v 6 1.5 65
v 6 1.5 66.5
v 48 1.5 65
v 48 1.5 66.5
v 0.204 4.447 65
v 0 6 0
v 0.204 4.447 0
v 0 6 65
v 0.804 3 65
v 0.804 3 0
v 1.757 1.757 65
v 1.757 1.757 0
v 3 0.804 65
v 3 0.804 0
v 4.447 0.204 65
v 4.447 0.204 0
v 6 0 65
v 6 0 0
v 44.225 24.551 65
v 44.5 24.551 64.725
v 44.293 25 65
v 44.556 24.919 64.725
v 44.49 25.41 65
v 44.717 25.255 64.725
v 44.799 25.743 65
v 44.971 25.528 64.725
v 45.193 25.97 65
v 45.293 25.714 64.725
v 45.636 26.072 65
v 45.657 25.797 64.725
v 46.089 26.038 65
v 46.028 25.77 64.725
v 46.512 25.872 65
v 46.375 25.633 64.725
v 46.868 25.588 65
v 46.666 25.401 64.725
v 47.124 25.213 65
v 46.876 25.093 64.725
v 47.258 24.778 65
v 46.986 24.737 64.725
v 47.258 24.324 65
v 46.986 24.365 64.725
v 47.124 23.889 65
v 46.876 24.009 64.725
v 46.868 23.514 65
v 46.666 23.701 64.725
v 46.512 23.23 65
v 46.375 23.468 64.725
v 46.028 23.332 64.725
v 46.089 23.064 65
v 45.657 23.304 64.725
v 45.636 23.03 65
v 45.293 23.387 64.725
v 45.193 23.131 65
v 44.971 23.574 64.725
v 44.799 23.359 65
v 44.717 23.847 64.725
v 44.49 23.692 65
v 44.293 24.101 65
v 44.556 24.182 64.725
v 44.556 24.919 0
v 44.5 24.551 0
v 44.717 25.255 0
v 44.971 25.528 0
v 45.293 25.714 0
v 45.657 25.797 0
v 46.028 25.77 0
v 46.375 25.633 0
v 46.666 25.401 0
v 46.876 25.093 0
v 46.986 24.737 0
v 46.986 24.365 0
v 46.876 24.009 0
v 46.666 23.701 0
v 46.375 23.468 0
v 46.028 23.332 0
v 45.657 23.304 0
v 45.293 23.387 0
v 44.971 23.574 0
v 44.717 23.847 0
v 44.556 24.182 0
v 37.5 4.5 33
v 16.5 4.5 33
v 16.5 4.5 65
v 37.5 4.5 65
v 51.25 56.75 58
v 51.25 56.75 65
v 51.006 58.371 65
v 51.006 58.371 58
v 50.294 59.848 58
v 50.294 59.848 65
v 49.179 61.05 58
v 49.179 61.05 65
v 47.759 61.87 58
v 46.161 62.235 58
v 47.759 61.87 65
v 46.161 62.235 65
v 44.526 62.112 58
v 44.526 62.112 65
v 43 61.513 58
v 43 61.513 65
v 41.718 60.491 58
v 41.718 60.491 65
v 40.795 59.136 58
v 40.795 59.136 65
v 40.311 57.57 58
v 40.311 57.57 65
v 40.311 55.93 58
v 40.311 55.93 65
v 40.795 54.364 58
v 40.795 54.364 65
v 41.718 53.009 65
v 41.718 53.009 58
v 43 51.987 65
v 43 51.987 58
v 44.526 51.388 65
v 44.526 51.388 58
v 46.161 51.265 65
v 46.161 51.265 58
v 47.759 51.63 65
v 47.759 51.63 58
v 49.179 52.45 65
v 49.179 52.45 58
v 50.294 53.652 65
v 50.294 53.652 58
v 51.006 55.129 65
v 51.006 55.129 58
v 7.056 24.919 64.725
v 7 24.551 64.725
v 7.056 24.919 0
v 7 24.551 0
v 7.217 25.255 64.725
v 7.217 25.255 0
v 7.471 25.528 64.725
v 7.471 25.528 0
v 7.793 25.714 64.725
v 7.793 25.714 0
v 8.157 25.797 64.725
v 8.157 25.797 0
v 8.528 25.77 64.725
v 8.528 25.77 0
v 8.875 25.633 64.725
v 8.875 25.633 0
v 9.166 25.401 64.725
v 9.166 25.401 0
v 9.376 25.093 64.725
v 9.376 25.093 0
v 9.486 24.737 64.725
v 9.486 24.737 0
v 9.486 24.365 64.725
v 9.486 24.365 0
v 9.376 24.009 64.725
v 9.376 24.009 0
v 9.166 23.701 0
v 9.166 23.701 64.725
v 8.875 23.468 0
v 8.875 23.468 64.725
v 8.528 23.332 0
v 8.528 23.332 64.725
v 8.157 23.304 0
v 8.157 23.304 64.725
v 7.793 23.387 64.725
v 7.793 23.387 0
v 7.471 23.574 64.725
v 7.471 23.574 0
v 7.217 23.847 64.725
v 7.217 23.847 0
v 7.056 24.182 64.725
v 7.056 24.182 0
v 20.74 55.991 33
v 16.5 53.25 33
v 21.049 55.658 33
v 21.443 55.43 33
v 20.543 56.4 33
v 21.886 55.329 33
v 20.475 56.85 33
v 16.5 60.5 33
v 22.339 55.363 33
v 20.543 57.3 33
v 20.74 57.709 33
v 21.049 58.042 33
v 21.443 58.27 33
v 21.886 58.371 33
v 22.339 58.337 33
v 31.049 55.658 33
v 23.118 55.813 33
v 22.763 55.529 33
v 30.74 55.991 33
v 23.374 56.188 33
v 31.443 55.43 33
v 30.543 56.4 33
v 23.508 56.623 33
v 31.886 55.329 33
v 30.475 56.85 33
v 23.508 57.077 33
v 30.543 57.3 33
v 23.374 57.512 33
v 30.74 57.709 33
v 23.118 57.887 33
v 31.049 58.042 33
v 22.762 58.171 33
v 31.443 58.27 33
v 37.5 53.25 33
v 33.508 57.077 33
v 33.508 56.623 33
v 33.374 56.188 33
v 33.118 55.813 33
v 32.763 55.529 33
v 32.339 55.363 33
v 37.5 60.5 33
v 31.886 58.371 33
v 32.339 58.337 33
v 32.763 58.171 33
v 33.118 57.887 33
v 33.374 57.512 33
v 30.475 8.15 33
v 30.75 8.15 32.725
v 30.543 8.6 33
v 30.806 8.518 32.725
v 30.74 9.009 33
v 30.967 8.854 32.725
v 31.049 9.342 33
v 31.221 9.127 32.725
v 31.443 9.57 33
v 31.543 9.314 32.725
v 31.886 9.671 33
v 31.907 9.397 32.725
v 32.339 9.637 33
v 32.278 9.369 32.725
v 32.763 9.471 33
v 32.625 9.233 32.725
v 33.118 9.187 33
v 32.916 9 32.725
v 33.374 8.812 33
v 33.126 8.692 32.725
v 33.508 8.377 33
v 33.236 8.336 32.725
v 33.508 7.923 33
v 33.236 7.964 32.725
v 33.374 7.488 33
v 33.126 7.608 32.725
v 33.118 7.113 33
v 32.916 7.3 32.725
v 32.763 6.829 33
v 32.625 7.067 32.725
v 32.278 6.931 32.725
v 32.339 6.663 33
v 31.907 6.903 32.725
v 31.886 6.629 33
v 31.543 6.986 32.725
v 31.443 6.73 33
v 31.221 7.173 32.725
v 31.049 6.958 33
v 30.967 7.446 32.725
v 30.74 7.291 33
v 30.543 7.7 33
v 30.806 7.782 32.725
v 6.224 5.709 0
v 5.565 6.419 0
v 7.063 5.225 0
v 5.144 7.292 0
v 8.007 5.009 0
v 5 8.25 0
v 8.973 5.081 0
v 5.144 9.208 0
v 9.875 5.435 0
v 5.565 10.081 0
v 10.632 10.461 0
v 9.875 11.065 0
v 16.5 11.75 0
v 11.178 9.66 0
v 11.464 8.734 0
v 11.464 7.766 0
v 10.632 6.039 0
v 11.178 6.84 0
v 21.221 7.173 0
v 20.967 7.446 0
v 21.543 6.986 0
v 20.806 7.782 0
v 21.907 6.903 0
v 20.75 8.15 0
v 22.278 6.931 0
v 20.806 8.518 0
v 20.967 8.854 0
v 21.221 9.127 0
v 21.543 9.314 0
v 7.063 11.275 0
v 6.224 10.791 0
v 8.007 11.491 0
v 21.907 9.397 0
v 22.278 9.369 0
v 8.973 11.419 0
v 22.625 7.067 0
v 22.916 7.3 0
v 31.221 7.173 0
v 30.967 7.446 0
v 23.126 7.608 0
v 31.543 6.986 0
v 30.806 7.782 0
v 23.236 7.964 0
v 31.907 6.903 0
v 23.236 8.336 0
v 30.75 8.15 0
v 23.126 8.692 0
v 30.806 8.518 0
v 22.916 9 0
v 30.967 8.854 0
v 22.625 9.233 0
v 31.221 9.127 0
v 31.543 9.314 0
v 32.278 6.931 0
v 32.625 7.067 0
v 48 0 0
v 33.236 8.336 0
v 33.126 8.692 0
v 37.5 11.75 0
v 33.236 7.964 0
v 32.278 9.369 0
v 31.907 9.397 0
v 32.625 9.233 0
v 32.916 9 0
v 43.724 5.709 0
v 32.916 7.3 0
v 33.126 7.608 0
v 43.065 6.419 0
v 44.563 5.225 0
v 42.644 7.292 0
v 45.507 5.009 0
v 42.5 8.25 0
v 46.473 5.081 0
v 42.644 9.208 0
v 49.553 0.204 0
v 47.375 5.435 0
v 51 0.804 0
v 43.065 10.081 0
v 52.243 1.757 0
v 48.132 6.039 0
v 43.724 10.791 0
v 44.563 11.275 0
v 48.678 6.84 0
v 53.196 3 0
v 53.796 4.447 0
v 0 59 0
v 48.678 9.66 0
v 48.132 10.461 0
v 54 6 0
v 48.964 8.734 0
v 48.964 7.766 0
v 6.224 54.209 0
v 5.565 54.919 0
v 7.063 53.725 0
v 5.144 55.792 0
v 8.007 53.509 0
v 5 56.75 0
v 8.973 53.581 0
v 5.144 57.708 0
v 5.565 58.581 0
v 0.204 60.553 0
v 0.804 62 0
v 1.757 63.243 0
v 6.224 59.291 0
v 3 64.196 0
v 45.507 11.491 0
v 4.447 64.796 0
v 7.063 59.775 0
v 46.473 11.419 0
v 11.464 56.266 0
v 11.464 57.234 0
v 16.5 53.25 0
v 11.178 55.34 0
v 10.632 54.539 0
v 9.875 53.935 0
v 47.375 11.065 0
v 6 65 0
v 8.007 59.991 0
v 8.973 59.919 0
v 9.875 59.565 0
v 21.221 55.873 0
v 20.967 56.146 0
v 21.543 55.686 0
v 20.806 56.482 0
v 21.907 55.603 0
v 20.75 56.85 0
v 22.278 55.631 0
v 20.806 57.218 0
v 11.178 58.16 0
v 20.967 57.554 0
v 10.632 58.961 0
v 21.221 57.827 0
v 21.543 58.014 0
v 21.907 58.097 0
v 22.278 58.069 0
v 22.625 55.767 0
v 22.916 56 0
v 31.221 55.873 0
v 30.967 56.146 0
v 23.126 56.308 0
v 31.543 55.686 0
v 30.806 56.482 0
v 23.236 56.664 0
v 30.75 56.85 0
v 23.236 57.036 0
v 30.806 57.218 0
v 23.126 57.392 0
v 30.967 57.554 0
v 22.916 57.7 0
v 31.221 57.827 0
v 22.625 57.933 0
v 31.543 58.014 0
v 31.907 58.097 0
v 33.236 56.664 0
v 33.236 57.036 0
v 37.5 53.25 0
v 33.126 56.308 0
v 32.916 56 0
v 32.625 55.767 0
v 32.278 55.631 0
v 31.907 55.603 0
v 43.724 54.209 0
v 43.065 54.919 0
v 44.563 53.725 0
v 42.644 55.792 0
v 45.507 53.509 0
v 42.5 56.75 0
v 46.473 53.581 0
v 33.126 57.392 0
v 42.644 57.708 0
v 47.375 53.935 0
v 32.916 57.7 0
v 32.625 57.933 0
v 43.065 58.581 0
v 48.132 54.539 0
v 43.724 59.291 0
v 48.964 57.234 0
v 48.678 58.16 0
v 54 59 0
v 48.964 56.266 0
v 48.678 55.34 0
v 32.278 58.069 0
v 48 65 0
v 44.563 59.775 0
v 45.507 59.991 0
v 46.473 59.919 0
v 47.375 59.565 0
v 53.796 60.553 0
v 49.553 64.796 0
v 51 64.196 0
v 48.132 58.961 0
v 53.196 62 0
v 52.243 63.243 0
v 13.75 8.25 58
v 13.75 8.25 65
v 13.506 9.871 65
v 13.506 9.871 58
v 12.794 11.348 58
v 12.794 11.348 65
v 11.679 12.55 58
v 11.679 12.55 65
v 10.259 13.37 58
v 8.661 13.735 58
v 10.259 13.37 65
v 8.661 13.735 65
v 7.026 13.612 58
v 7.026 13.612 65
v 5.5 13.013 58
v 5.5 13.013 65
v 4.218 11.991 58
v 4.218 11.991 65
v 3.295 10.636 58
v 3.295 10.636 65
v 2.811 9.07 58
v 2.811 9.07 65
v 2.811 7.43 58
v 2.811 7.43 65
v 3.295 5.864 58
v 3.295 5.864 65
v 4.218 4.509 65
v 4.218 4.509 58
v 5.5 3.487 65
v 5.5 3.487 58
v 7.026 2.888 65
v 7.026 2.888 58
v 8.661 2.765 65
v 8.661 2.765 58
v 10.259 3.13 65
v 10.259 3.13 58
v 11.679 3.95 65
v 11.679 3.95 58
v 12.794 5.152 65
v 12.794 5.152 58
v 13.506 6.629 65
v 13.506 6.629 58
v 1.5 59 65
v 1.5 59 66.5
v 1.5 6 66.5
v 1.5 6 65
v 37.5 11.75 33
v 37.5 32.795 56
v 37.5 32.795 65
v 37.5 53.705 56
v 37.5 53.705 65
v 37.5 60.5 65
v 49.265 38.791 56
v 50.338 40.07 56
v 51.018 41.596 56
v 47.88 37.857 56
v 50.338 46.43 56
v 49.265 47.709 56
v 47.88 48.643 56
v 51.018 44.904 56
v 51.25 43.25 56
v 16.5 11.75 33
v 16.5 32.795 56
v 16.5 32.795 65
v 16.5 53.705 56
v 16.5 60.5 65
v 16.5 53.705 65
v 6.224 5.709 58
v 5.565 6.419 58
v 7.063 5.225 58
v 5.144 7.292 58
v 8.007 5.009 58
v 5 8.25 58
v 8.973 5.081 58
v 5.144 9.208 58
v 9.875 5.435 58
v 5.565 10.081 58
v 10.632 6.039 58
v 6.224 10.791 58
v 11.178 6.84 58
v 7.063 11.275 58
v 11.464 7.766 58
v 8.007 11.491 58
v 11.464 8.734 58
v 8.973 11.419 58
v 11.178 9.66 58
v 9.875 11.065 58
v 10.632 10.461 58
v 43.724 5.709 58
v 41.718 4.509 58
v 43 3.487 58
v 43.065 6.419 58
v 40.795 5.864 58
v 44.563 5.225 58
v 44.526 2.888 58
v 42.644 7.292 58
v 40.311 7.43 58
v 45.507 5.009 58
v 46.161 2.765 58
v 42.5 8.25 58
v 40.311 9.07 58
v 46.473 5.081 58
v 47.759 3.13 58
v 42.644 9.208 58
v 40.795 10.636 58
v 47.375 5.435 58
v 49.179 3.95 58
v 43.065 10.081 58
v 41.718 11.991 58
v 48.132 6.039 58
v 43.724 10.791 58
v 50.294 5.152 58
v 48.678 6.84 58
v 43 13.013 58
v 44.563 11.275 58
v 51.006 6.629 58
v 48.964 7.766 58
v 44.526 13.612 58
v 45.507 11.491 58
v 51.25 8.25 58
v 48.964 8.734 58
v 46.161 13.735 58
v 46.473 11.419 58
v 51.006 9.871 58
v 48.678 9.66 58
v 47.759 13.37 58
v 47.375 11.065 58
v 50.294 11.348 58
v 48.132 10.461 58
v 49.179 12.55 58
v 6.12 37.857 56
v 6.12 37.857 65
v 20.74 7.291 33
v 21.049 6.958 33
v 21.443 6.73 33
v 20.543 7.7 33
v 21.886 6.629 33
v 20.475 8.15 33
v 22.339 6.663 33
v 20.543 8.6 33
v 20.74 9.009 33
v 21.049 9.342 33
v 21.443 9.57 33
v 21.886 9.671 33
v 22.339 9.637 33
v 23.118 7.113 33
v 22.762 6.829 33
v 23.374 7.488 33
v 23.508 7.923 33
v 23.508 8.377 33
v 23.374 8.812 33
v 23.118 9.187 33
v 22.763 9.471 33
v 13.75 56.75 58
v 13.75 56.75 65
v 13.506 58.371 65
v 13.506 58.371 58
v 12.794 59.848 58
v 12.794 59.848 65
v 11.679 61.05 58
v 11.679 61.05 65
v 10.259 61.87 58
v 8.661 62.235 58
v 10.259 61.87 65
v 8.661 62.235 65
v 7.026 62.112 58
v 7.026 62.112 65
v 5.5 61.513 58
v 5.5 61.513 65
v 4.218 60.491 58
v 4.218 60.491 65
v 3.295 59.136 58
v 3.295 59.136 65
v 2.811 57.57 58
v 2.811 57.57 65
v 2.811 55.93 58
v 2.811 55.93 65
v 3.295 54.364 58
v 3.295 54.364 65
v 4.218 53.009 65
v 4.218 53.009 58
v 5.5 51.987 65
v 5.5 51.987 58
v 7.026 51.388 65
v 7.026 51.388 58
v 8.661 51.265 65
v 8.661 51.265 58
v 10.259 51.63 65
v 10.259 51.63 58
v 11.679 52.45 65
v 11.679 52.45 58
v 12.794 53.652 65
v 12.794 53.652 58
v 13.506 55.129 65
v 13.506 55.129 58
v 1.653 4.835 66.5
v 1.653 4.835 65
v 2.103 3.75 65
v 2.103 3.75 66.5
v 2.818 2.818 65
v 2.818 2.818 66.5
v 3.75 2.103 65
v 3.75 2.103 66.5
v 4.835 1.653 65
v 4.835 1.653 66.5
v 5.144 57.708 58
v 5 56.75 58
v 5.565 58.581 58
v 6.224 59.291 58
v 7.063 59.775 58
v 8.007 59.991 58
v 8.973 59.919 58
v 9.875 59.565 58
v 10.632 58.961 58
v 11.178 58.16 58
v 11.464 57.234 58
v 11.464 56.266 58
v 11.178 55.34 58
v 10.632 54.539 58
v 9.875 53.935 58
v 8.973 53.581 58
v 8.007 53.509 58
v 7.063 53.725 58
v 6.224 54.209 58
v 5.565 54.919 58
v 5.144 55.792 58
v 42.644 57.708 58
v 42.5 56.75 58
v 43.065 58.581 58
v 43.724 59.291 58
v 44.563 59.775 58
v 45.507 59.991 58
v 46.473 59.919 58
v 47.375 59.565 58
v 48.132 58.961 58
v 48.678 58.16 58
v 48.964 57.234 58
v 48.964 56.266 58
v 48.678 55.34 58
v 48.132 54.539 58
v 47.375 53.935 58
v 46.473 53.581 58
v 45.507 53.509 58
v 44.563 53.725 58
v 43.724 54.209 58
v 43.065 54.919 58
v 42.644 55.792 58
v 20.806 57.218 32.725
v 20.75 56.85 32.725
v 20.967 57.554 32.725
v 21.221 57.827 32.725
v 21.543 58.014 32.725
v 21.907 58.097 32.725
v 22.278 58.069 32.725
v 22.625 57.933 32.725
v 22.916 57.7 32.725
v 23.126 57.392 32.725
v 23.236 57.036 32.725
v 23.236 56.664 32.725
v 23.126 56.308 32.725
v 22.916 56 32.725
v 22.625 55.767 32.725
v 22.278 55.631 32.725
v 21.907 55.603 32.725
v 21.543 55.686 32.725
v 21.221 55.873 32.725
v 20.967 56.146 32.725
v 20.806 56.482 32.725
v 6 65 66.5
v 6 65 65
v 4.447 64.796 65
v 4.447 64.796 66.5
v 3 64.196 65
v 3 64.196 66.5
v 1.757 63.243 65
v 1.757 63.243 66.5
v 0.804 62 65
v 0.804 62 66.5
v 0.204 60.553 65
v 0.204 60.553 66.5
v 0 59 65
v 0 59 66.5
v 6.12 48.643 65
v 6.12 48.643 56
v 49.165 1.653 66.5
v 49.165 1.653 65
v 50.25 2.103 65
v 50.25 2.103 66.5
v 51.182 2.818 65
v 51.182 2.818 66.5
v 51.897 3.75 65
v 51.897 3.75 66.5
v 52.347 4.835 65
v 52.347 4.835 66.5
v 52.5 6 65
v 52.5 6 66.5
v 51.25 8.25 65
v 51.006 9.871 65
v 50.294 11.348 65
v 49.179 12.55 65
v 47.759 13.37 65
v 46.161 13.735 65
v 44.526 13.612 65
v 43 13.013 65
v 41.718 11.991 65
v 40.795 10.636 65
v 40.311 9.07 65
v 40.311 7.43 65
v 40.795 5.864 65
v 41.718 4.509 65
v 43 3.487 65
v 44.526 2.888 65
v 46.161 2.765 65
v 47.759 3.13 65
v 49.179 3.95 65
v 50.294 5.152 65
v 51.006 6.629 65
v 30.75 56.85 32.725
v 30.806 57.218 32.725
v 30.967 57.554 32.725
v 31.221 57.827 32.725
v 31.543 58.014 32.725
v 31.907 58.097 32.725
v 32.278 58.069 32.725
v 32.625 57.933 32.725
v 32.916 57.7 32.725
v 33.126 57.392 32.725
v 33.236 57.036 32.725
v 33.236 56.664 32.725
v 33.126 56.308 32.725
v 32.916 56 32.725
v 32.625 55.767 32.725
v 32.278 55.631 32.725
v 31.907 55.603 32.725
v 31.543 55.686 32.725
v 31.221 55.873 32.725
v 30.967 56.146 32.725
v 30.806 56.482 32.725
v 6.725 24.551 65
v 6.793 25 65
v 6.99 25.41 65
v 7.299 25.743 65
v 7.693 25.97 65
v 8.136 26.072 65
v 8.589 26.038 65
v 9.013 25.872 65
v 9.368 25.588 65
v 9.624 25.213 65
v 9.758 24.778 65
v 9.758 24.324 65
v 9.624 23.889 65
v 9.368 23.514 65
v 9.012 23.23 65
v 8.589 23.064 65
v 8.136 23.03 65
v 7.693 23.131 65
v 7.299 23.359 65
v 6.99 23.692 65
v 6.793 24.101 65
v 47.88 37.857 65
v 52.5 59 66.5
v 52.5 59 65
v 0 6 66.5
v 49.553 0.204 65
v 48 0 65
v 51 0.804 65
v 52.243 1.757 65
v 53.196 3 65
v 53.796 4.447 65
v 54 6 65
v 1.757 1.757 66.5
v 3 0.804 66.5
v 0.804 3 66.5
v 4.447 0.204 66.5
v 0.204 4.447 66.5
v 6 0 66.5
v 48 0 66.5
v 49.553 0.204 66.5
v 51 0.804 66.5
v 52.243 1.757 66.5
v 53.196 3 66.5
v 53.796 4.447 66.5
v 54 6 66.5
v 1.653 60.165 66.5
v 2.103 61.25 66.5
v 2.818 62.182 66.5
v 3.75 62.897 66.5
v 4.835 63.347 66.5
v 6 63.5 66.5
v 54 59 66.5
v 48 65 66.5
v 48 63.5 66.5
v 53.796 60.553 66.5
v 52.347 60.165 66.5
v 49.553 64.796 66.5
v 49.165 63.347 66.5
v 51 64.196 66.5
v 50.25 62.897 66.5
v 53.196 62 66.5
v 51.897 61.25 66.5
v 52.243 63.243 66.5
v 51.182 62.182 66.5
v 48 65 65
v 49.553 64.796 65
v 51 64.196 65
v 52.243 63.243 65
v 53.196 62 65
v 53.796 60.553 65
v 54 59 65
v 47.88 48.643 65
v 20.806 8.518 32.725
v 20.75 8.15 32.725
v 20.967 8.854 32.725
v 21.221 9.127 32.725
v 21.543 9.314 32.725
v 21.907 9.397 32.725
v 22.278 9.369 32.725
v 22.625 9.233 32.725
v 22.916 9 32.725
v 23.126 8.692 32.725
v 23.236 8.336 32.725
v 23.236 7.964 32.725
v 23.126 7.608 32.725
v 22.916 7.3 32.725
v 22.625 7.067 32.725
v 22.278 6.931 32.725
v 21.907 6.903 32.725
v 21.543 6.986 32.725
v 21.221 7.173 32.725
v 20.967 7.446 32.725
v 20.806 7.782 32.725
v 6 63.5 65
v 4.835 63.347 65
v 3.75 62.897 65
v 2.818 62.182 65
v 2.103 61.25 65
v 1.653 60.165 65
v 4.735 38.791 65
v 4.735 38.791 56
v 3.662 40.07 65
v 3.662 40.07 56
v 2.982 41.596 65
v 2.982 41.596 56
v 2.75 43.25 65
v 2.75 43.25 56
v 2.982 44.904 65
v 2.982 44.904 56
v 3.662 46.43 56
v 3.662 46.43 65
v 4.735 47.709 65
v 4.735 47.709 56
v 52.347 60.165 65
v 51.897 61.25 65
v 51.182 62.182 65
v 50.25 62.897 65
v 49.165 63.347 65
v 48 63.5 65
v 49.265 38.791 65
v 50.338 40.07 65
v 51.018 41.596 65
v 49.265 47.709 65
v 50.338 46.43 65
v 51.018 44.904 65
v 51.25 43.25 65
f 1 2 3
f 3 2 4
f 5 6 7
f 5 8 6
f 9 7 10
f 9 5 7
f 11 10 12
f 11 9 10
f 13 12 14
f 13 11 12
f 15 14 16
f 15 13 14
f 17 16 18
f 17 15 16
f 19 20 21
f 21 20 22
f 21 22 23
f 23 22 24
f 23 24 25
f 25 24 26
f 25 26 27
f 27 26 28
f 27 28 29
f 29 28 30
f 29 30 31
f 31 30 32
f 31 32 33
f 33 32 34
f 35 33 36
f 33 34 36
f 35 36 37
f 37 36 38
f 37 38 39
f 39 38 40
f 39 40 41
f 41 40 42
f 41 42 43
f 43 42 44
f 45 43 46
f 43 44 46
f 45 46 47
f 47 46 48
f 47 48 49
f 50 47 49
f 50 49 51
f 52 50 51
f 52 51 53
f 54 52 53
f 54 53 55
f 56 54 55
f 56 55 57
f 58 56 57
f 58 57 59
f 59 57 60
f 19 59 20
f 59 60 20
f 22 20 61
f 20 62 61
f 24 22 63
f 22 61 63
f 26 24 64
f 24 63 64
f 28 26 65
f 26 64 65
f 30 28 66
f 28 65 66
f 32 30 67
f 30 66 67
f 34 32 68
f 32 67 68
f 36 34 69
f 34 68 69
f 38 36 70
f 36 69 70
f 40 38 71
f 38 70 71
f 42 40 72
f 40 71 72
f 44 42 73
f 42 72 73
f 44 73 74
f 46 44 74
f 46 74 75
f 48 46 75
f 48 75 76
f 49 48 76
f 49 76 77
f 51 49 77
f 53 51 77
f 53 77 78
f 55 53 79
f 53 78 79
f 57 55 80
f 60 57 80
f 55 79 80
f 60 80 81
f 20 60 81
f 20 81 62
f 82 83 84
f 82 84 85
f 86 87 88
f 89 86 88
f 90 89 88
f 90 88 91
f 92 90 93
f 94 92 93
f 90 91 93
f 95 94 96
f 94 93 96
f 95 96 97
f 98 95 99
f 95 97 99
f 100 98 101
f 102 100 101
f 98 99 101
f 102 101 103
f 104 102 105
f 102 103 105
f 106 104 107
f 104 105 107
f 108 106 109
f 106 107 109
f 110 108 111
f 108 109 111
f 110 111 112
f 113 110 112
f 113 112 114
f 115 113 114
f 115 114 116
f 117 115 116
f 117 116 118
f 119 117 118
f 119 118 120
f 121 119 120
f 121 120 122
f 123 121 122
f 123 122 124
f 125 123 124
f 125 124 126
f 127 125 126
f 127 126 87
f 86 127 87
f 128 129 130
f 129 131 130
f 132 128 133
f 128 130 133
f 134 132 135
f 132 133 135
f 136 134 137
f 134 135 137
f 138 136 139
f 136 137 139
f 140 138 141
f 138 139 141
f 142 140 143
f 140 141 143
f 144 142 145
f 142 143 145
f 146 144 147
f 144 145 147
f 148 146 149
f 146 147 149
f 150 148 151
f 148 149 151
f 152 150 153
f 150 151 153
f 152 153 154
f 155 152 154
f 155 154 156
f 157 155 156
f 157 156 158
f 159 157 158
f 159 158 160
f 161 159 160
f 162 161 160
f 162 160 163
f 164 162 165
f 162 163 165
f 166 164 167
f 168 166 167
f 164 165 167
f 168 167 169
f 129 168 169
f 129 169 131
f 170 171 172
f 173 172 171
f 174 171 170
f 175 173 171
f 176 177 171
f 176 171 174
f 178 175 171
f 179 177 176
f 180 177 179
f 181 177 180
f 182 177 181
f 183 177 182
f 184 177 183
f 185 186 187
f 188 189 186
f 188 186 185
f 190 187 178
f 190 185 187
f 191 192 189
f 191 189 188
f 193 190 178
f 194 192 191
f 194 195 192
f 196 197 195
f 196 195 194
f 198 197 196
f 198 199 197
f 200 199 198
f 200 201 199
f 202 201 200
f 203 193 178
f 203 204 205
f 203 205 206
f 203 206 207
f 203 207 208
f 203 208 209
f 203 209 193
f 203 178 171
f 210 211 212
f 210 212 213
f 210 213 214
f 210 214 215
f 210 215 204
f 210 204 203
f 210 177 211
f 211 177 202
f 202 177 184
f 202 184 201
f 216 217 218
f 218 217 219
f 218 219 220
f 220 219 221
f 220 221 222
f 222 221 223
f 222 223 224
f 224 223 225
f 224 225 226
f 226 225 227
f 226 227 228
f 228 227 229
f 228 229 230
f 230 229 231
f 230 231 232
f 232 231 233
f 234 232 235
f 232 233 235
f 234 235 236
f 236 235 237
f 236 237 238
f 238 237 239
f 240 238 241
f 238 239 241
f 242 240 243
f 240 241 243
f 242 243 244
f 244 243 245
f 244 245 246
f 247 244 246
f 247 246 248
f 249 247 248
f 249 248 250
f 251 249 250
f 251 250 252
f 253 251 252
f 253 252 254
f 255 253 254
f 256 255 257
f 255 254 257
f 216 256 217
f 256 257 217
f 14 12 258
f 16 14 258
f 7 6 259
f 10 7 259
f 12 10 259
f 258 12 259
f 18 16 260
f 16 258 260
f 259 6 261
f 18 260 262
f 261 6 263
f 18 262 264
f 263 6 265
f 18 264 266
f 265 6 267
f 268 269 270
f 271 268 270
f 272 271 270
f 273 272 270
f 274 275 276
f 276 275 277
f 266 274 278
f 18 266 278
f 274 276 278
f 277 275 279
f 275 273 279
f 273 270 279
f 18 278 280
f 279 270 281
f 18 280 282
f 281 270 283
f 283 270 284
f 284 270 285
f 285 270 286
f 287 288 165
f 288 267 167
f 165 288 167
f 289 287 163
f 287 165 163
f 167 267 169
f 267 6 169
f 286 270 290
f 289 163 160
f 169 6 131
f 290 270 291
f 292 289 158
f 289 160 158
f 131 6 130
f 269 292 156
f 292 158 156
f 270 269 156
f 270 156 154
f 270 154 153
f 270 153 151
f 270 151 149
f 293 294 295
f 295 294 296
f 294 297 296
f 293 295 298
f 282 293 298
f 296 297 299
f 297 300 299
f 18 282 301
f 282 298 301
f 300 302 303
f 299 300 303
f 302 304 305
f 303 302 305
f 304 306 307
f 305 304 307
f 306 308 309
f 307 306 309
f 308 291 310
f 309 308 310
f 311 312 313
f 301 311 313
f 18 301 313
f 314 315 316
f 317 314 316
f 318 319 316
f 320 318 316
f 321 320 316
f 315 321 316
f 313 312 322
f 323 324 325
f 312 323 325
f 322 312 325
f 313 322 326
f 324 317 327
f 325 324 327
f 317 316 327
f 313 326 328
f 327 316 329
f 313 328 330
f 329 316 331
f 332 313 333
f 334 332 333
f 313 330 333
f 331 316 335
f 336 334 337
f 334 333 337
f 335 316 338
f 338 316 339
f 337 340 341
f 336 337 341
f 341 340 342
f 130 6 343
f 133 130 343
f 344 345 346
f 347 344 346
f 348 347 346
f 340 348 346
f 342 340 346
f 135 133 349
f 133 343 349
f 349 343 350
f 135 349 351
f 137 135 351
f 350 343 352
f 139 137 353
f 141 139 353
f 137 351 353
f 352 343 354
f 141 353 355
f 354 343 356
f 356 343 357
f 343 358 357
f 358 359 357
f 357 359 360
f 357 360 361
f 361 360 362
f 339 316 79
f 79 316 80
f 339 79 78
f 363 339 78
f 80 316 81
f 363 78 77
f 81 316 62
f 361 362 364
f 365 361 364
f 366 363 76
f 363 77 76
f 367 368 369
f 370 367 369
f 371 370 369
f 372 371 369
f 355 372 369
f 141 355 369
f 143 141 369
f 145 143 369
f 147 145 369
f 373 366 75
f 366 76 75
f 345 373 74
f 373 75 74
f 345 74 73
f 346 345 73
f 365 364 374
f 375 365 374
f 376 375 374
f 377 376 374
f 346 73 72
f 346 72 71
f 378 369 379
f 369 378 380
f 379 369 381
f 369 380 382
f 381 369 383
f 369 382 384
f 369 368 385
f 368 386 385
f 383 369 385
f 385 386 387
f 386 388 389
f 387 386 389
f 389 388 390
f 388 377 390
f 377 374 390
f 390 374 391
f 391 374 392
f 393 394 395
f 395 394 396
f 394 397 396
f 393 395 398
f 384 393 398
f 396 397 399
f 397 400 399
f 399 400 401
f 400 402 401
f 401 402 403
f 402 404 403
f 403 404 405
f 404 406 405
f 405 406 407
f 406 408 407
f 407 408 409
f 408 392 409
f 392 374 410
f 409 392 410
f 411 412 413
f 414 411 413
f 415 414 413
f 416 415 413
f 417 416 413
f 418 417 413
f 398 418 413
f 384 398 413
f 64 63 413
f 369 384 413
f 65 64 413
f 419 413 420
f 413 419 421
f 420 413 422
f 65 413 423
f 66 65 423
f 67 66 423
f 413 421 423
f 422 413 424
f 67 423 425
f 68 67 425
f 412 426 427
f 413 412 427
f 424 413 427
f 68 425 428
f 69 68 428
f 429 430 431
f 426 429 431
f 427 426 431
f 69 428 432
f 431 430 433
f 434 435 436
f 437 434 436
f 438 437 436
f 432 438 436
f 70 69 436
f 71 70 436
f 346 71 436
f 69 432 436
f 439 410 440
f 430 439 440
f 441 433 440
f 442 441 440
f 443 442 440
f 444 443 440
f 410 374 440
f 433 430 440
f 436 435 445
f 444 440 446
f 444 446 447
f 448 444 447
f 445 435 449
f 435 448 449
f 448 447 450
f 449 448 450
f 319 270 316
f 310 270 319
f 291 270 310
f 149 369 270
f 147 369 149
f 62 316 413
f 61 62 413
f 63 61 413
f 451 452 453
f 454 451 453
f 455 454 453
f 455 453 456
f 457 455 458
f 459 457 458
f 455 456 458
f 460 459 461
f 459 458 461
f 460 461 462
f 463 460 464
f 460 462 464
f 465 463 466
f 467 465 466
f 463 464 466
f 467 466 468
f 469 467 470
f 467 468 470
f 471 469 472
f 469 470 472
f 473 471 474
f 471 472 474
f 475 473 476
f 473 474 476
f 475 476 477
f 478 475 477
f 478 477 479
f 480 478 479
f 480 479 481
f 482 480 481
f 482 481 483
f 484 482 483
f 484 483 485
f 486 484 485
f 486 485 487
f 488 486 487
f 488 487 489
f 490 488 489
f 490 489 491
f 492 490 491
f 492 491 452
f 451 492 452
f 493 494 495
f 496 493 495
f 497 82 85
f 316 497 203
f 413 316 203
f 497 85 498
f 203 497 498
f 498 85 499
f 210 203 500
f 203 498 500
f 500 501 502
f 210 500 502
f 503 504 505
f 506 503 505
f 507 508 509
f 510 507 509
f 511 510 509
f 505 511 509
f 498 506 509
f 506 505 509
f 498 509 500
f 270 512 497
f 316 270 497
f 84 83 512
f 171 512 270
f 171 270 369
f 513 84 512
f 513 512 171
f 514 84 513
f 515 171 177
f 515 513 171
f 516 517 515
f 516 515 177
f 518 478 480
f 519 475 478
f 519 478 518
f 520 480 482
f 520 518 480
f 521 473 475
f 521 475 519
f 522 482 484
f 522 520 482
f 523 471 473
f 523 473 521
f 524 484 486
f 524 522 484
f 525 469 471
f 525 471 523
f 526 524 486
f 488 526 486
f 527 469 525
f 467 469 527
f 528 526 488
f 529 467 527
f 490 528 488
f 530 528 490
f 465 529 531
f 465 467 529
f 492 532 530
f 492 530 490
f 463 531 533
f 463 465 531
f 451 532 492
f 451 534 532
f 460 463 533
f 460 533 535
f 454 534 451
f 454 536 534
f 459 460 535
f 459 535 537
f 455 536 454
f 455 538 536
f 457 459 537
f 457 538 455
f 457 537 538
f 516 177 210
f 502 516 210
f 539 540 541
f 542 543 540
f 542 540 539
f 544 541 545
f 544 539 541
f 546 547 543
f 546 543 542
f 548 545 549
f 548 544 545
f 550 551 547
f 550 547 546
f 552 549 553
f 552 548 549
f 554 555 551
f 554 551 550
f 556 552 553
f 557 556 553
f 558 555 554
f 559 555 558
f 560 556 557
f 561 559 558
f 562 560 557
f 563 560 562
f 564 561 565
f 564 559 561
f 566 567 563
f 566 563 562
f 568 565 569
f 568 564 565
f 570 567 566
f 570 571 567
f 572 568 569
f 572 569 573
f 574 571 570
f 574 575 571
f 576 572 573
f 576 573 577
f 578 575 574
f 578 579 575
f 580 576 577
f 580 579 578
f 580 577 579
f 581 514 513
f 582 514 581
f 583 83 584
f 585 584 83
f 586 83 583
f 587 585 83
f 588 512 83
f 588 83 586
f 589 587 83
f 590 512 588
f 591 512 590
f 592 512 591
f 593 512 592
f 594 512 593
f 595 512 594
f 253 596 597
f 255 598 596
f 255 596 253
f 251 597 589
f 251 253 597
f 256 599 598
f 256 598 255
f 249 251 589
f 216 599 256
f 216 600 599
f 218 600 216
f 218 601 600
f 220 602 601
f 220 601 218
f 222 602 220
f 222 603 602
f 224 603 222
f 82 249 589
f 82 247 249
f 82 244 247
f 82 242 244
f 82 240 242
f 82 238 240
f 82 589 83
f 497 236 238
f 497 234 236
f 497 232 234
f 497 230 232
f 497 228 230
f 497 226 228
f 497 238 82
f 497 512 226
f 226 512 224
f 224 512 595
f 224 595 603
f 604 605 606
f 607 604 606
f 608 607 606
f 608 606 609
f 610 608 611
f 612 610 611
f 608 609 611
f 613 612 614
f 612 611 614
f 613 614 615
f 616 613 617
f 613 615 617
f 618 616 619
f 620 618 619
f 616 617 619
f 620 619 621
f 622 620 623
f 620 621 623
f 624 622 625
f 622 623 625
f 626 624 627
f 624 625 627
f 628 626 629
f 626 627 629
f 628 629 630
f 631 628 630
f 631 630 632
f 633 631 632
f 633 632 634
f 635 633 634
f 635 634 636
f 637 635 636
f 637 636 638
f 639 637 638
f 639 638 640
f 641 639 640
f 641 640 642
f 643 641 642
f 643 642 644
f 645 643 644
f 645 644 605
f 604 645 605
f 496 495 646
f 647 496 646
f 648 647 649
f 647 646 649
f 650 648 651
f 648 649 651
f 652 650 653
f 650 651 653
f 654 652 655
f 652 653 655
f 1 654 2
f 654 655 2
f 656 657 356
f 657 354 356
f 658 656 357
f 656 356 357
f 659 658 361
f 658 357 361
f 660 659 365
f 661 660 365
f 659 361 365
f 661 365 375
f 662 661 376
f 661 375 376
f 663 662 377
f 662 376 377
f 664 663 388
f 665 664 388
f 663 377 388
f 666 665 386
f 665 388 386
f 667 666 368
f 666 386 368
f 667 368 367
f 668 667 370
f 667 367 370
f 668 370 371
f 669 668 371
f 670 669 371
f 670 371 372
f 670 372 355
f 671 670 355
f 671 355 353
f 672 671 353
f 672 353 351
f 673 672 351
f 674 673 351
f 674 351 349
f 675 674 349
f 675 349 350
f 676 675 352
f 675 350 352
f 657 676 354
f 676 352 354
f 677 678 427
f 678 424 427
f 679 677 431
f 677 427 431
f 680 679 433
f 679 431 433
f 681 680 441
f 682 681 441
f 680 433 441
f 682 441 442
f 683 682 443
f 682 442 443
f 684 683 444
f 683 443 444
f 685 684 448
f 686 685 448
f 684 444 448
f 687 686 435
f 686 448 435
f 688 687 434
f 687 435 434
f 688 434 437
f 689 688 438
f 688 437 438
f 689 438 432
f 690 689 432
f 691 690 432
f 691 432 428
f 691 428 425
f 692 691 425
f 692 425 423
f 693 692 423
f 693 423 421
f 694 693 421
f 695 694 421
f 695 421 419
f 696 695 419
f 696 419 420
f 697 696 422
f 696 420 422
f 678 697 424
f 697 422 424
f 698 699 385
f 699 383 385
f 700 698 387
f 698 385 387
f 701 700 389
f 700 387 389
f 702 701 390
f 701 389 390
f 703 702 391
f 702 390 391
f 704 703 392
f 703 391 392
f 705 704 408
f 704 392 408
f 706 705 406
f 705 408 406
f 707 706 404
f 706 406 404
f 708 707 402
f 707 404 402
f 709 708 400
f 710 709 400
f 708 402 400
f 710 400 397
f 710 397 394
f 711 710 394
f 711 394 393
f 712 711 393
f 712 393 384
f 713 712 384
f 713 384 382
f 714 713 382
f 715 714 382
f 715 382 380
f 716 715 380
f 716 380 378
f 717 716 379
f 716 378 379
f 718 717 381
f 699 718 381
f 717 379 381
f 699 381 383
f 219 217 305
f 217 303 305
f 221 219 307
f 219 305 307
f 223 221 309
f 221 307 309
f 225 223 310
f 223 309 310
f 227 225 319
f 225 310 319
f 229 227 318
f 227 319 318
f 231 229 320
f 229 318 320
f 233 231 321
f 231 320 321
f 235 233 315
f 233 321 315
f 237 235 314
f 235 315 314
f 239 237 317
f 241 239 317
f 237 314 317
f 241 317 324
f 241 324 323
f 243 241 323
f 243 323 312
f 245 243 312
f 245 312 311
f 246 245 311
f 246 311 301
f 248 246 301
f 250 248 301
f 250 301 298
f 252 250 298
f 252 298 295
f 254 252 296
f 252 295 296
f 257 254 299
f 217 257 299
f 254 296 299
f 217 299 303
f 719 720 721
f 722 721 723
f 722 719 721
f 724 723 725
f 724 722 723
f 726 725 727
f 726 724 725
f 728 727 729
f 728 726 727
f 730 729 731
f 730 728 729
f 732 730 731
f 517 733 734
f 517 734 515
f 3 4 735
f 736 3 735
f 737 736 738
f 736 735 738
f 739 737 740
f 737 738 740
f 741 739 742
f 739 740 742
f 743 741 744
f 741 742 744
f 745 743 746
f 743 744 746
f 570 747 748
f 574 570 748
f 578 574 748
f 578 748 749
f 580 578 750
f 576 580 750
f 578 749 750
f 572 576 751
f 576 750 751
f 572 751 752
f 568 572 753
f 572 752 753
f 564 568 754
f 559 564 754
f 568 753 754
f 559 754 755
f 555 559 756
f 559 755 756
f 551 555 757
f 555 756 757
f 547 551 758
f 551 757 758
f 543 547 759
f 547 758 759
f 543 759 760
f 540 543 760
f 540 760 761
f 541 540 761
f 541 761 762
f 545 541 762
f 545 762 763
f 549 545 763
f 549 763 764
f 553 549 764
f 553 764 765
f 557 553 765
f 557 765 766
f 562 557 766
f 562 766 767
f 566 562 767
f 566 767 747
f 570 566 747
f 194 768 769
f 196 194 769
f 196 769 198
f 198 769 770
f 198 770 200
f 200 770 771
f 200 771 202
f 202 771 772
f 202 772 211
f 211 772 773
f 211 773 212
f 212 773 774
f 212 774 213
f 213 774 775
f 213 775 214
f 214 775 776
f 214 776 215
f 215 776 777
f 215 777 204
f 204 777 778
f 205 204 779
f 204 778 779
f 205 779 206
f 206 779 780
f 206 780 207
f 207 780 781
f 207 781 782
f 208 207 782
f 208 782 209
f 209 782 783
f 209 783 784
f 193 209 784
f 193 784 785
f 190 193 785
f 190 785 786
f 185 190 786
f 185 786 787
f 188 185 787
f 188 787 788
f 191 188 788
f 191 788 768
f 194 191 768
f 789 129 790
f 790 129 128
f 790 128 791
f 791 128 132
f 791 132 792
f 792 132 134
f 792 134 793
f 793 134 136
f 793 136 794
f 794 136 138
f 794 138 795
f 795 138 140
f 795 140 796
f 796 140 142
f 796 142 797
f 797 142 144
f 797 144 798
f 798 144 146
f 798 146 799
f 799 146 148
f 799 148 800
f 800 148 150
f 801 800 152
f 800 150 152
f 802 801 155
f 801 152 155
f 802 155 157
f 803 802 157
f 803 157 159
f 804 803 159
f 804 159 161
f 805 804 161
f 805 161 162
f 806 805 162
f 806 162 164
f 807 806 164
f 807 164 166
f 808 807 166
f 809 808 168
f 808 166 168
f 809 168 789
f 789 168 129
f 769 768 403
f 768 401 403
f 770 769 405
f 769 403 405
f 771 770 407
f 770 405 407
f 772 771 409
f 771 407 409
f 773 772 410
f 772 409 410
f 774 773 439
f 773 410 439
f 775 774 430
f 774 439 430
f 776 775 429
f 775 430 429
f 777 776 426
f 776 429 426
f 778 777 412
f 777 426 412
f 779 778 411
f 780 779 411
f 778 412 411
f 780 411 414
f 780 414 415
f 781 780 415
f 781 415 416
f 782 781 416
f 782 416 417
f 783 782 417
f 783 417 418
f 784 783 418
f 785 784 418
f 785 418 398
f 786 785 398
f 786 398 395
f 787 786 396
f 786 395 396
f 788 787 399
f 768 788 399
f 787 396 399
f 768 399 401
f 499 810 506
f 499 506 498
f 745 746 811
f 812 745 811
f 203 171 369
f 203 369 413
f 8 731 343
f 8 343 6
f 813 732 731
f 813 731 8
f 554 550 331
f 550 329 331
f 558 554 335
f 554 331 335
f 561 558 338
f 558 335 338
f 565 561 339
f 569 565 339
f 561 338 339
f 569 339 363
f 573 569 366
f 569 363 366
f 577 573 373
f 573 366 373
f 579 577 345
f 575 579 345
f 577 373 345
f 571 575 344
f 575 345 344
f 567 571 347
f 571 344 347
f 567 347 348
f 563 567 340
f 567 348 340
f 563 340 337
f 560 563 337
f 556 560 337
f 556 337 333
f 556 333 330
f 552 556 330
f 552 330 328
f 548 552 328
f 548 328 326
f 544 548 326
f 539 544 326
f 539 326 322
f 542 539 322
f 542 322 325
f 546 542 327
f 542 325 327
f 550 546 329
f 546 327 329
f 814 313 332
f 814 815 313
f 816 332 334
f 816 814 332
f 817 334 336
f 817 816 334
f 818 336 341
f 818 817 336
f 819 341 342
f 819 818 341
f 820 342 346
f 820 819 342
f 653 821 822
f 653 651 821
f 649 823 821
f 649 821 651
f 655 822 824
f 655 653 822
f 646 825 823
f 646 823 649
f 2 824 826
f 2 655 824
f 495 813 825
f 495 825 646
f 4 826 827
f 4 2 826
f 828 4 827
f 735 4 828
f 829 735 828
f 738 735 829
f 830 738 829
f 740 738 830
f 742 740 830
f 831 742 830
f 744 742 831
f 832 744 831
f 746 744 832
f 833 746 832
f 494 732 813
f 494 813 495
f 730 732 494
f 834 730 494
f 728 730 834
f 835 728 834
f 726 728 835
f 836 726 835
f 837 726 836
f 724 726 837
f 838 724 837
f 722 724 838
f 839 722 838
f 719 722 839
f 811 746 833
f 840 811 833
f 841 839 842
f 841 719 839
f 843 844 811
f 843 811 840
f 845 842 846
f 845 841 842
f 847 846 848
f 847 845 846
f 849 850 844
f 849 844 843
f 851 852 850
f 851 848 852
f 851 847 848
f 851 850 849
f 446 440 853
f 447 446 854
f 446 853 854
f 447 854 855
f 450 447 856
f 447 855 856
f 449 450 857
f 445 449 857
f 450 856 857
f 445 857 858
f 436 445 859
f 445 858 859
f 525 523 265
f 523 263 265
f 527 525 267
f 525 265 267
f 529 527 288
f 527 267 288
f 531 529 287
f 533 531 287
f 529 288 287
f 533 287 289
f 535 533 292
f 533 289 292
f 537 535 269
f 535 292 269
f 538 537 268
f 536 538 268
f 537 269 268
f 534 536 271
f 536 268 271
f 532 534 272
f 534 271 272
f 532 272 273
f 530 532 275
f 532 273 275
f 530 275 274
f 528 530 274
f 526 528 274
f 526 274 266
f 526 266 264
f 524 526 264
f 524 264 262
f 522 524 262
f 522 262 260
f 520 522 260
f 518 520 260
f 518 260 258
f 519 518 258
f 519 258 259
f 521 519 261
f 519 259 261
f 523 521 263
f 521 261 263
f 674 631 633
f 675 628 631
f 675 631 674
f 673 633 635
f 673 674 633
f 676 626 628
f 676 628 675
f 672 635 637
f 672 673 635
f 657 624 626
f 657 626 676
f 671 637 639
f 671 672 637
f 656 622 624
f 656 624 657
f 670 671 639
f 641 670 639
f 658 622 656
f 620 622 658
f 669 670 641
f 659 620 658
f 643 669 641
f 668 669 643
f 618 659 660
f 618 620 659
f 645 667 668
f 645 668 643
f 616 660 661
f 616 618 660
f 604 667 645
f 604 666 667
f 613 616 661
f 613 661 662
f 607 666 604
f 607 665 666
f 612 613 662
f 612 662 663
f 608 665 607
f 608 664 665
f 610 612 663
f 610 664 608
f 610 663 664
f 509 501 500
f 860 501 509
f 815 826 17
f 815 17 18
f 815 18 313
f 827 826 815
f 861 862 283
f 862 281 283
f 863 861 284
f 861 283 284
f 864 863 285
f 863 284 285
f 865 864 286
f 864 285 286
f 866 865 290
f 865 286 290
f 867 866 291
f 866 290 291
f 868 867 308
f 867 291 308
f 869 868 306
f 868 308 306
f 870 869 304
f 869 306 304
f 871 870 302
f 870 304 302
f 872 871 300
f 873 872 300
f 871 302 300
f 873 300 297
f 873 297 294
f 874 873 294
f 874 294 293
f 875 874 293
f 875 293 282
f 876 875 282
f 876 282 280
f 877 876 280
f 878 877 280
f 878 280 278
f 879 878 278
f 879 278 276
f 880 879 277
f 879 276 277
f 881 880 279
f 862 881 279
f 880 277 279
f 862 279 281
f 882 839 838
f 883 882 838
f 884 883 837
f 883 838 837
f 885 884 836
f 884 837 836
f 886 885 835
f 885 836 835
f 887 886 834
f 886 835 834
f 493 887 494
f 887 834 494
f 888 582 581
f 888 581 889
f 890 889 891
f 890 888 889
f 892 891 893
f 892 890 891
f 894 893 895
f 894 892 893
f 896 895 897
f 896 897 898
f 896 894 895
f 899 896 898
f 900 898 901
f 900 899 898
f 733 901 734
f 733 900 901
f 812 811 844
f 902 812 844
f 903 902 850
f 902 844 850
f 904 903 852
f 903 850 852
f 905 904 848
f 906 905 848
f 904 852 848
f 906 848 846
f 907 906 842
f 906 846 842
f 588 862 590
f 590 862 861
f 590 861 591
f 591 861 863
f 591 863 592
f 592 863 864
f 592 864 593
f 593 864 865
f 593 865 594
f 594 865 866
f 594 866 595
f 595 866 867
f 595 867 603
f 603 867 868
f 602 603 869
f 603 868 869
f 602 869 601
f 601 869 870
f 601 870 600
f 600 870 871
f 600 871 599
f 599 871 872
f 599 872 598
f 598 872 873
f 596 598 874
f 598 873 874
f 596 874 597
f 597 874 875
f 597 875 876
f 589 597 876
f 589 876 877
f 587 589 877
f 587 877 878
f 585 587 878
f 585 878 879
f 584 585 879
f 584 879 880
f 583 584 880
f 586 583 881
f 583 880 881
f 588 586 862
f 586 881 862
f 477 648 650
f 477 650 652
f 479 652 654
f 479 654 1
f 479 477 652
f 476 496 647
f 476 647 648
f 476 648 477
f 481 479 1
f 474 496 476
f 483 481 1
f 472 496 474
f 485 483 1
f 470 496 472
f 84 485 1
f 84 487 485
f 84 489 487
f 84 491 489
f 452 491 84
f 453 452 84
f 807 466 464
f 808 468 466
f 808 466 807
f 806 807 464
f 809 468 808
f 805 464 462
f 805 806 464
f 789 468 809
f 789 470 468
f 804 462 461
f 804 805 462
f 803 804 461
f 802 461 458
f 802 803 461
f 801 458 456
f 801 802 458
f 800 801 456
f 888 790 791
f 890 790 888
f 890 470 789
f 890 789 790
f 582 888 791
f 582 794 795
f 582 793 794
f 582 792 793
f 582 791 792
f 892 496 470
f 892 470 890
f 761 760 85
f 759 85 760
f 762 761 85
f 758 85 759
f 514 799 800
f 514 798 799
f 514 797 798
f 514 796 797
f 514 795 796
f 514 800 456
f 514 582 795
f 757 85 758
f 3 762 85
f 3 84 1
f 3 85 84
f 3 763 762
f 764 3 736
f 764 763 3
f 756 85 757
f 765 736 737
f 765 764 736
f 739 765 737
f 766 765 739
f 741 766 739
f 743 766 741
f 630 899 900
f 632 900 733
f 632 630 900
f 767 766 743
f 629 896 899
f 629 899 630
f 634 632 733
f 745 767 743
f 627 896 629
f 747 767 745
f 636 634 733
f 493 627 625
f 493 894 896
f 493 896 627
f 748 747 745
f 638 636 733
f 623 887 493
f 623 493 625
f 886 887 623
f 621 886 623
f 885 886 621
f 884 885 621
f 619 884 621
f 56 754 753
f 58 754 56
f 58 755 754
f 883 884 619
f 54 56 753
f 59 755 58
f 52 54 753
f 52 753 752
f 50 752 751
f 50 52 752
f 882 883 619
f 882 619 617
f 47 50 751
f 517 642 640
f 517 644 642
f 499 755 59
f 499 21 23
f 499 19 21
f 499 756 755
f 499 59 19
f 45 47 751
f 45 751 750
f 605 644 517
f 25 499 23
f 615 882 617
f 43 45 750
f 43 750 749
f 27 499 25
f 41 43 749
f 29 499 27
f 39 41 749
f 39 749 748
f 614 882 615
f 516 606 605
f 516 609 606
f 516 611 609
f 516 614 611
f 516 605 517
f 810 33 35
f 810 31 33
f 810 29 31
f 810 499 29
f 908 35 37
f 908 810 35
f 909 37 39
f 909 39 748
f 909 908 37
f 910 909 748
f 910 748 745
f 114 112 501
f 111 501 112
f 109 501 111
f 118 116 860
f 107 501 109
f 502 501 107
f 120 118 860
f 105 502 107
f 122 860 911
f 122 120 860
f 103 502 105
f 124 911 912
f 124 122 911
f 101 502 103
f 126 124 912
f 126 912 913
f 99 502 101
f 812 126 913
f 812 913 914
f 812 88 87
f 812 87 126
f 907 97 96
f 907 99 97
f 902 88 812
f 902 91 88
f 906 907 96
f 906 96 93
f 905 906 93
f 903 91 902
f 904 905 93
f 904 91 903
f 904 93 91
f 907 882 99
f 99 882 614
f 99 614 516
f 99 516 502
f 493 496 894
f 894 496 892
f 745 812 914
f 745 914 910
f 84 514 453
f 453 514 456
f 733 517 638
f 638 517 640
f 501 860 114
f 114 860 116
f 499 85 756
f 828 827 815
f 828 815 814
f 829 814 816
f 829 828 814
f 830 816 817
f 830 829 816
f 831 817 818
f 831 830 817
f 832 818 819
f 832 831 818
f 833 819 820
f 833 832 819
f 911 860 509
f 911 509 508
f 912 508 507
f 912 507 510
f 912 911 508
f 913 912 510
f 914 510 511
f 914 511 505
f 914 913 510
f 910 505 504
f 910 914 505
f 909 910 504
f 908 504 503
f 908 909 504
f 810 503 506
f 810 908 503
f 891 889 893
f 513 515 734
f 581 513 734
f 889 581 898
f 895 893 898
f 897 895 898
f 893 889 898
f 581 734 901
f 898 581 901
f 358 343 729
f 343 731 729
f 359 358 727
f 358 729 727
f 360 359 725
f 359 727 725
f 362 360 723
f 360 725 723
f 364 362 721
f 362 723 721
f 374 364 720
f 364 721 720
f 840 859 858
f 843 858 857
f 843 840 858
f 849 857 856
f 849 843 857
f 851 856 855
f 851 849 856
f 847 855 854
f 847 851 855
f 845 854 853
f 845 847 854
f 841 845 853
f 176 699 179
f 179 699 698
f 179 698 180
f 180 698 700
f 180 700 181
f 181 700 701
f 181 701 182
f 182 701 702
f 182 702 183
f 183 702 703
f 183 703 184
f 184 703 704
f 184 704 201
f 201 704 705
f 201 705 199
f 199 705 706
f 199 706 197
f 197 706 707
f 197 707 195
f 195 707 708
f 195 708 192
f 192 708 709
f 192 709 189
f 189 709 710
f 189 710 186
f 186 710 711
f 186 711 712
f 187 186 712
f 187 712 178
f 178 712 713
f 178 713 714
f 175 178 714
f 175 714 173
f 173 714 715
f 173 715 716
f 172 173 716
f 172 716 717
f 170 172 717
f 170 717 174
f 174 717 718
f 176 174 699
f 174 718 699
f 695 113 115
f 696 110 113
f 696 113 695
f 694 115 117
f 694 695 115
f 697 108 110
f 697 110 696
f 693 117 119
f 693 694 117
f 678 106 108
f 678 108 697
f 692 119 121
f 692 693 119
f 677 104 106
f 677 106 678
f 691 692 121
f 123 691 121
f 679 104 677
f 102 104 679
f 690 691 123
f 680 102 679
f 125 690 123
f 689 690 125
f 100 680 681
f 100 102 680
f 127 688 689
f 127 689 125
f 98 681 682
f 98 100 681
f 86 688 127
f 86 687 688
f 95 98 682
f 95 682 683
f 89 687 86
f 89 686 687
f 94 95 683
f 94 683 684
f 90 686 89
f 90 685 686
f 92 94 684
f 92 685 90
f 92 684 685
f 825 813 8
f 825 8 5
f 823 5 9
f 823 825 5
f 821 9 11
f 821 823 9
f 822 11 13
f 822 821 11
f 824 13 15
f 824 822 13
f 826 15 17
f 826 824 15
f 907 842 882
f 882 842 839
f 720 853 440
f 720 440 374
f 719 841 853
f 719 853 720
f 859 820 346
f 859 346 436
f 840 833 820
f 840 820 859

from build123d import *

# Parameters (mm, degrees)
SKETCH1_W                   = 54
SKETCH1_H                   = 65
BOSS_EXTRUDE1_DEPTH         = 65
SKETCH2_W                   = 21
SKETCH2_H                   = 41.5
CUT_EXTRUDE1_DEPTH          = 107.611444039
FILLET1_R                   = 6
SKETCH3_W                   = 21
SKETCH3_H                   = 56
CUT_EXTRUDE2_DEPTH          = 32
CUT_EXTRUDE_THIN3_DEPTH     = 9
CUT_EXTRUDE3_DEPTH          = 9
M3_TAPPED_HOLE1_D           = 2.5
M3_TAPPED_HOLE1_CSINK_D     = 3.05
M3_TAPPED_HOLE1_CSINK_ANGLE = 90
HOLE1_D                     = 6.5
HOLE1_CBORE_D               = 11
HOLE1_CBORE_DEPTH           = 7
EXTRUDE_THIN1_START         = 1.5
EXTRUDE_THIN1_DEPTH         = 1.5
M3_TAPPED_HOLE2_D           = 2.5
M3_TAPPED_HOLE2_CSINK_D     = 3.05
M3_TAPPED_HOLE2_CSINK_ANGLE = 90


with BuildPart() as part:
    # Sketch1 → Boss-Extrude1 (new body)
    with BuildSketch(Plane.XY):
        with Locations((27, 32.5)):
            Rectangle(SKETCH1_W, SKETCH1_H)
    extrude(amount=BOSS_EXTRUDE1_DEPTH)

    # Sketch2 → Cut-Extrude1 (cut, through all)
    with BuildSketch(Plane.XY.offset(65)):
        with Locations((27, 32.5)):
            Rectangle(SKETCH2_W, SKETCH2_H)
    extrude(amount=-CUT_EXTRUDE1_DEPTH, mode=Mode.SUBTRACT)

    # Fillet1
    fillet1_edges = [part.edges().sort_by_distance(p)[0] for p in [
        (0, 65, 32.5),
        (0, 0, 32.5),
        (54, 0, 32.5),
        (54, 65, 32.5),
    ]]
    fillet(fillet1_edges, radius=FILLET1_R)

    # Sketch3 → Cut-Extrude2 (cut)
    with BuildSketch(Plane.XY.offset(65)):
        with Locations((27, 32.5)):
            Rectangle(SKETCH3_W, SKETCH3_H)
    extrude(amount=-CUT_EXTRUDE2_DEPTH, mode=Mode.SUBTRACT)

    # Sketch4 → Cut-Extrude-Thin3 (cut)
    with BuildSketch(Plane.XY.offset(65)):
        with BuildLine():
            Line((6.119863014, 48.642808121), (20.863013699, 55.83321895))
            ThreePointArc((20.863013699, 55.83321895), (27, 57.25), (33.136986301, 55.83321895))
            Line((33.136986301, 55.83321895), (47.880136986, 48.642808121))
            ThreePointArc((47.880136986, 48.642808121), (51.25, 43.25), (47.880136986, 37.857191879))
            Line((47.880136986, 37.857191879), (33.136986301, 30.66678105))
            ThreePointArc((33.136986301, 30.66678105), (27, 29.25), (20.863013699, 30.66678105))
            Line((20.863013699, 30.66678105), (6.119863014, 37.857191879))
            ThreePointArc((6.119863014, 37.857191879), (2.75, 43.25), (6.119863014, 48.642808121))
        make_face()
        with BuildLine():
            Line((6.339041096, 48.193407445), (21.082191781, 55.383818273))
            ThreePointArc((21.082191781, 55.383818273), (27, 56.75), (32.917808219, 55.383818273))
            Line((32.917808219, 55.383818273), (47.660958904, 48.193407445))
            ThreePointArc((47.660958904, 48.193407445), (50.75, 43.25), (47.660958904, 38.306592555))
            Line((47.660958904, 38.306592555), (32.917808219, 31.116181727))
            ThreePointArc((32.917808219, 31.116181727), (27, 29.75), (21.082191781, 31.116181727))
            Line((21.082191781, 31.116181727), (6.339041096, 38.306592555))
            ThreePointArc((6.339041096, 38.306592555), (3.25, 43.25), (6.339041096, 48.193407445))
        make_face(mode=Mode.SUBTRACT)
    extrude(amount=-CUT_EXTRUDE_THIN3_DEPTH, mode=Mode.SUBTRACT)

    # Sketch4<3> → Cut-Extrude3 (cut)
    with BuildSketch(Plane.XY.offset(65)):
        with BuildLine():
            Line((32.917808219, 55.383818273), (47.660958904, 48.193407445))
            ThreePointArc((47.660958904, 48.193407445), (50.75, 43.25), (47.660958904, 38.306592555))
            Line((47.660958904, 38.306592555), (32.917808219, 31.116181727))
            ThreePointArc((32.917808219, 31.116181727), (27, 29.75), (21.082191781, 31.116181727))
            Line((21.082191781, 31.116181727), (6.339041096, 38.306592555))
            ThreePointArc((6.339041096, 38.306592555), (3.25, 43.25), (6.339041096, 48.193407445))
            Line((6.339041096, 48.193407445), (21.082191781, 55.383818273))
            ThreePointArc((21.082191781, 55.383818273), (27, 56.75), (32.917808219, 55.383818273))
        make_face()
    extrude(amount=-CUT_EXTRUDE3_DEPTH, mode=Mode.SUBTRACT)

    # M3 Tapped Hole1 (through all)
    with Locations(Plane(origin=(22, 56.85, 33), x_dir=(1, 0, 0), z_dir=(0, 0, 1))):
        with Locations((0, 0), (10, 0), (10, -48.7), (0, -48.7)):
            CounterSinkHole(M3_TAPPED_HOLE1_D / 2, M3_TAPPED_HOLE1_CSINK_D / 2, counter_sink_angle=M3_TAPPED_HOLE1_CSINK_ANGLE)

    # Hole1 (through all)
    with Locations(Plane(origin=(8.25, 56.75, 65), x_dir=(1, 0, 0), z_dir=(0, 0, 1))):
        with Locations((0, 0), (37.5, 0), (37.5, -48.5), (0, -48.5)):
            CounterBoreHole(HOLE1_D / 2, HOLE1_CBORE_D / 2, HOLE1_CBORE_DEPTH)

    # Sketch10 → Extrude-Thin1 (add)
    with BuildSketch(Plane.XY.offset(65).offset(EXTRUDE_THIN1_START)):
        with BuildLine():
            Line((48, 65), (6, 65))
            ThreePointArc((6, 65), (1.757359313, 63.242640687), (0, 59))
            Line((0, 59), (0, 6))
            ThreePointArc((0, 6), (1.757359313, 1.757359313), (6, 0))
            Line((6, 0), (48, 0))
            ThreePointArc((48, 0), (52.242640687, 1.757359313), (54, 6))
            Line((54, 6), (54, 59))
            ThreePointArc((54, 59), (52.242640687, 63.242640687), (48, 65))
        make_face()
        with BuildLine():
            Line((48, 63.5), (6, 63.5))
            ThreePointArc((6, 63.5), (2.818019485, 62.181980515), (1.5, 59))
            Line((1.5, 59), (1.5, 6))
            ThreePointArc((1.5, 6), (2.818019485, 2.818019485), (6, 1.5))
            Line((6, 1.5), (48, 1.5))
            ThreePointArc((48, 1.5), (51.181980515, 2.818019485), (52.5, 6))
            Line((52.5, 6), (52.5, 59))
            ThreePointArc((52.5, 59), (51.181980515, 62.181980515), (48, 63.5))
        make_face(mode=Mode.SUBTRACT)
    extrude(amount=-EXTRUDE_THIN1_DEPTH)

    # M3 Tapped Hole2 (through all)
    with Locations(Plane(origin=(8.25, 24.550881691, 65), x_dir=(1, 0, 0), z_dir=(0, 0, 1))):
        with Locations((0, 0), (37.5, 0)):
            CounterSinkHole(M3_TAPPED_HOLE2_D / 2, M3_TAPPED_HOLE2_CSINK_D / 2, counter_sink_angle=M3_TAPPED_HOLE2_CSINK_ANGLE)


solid = part.part
